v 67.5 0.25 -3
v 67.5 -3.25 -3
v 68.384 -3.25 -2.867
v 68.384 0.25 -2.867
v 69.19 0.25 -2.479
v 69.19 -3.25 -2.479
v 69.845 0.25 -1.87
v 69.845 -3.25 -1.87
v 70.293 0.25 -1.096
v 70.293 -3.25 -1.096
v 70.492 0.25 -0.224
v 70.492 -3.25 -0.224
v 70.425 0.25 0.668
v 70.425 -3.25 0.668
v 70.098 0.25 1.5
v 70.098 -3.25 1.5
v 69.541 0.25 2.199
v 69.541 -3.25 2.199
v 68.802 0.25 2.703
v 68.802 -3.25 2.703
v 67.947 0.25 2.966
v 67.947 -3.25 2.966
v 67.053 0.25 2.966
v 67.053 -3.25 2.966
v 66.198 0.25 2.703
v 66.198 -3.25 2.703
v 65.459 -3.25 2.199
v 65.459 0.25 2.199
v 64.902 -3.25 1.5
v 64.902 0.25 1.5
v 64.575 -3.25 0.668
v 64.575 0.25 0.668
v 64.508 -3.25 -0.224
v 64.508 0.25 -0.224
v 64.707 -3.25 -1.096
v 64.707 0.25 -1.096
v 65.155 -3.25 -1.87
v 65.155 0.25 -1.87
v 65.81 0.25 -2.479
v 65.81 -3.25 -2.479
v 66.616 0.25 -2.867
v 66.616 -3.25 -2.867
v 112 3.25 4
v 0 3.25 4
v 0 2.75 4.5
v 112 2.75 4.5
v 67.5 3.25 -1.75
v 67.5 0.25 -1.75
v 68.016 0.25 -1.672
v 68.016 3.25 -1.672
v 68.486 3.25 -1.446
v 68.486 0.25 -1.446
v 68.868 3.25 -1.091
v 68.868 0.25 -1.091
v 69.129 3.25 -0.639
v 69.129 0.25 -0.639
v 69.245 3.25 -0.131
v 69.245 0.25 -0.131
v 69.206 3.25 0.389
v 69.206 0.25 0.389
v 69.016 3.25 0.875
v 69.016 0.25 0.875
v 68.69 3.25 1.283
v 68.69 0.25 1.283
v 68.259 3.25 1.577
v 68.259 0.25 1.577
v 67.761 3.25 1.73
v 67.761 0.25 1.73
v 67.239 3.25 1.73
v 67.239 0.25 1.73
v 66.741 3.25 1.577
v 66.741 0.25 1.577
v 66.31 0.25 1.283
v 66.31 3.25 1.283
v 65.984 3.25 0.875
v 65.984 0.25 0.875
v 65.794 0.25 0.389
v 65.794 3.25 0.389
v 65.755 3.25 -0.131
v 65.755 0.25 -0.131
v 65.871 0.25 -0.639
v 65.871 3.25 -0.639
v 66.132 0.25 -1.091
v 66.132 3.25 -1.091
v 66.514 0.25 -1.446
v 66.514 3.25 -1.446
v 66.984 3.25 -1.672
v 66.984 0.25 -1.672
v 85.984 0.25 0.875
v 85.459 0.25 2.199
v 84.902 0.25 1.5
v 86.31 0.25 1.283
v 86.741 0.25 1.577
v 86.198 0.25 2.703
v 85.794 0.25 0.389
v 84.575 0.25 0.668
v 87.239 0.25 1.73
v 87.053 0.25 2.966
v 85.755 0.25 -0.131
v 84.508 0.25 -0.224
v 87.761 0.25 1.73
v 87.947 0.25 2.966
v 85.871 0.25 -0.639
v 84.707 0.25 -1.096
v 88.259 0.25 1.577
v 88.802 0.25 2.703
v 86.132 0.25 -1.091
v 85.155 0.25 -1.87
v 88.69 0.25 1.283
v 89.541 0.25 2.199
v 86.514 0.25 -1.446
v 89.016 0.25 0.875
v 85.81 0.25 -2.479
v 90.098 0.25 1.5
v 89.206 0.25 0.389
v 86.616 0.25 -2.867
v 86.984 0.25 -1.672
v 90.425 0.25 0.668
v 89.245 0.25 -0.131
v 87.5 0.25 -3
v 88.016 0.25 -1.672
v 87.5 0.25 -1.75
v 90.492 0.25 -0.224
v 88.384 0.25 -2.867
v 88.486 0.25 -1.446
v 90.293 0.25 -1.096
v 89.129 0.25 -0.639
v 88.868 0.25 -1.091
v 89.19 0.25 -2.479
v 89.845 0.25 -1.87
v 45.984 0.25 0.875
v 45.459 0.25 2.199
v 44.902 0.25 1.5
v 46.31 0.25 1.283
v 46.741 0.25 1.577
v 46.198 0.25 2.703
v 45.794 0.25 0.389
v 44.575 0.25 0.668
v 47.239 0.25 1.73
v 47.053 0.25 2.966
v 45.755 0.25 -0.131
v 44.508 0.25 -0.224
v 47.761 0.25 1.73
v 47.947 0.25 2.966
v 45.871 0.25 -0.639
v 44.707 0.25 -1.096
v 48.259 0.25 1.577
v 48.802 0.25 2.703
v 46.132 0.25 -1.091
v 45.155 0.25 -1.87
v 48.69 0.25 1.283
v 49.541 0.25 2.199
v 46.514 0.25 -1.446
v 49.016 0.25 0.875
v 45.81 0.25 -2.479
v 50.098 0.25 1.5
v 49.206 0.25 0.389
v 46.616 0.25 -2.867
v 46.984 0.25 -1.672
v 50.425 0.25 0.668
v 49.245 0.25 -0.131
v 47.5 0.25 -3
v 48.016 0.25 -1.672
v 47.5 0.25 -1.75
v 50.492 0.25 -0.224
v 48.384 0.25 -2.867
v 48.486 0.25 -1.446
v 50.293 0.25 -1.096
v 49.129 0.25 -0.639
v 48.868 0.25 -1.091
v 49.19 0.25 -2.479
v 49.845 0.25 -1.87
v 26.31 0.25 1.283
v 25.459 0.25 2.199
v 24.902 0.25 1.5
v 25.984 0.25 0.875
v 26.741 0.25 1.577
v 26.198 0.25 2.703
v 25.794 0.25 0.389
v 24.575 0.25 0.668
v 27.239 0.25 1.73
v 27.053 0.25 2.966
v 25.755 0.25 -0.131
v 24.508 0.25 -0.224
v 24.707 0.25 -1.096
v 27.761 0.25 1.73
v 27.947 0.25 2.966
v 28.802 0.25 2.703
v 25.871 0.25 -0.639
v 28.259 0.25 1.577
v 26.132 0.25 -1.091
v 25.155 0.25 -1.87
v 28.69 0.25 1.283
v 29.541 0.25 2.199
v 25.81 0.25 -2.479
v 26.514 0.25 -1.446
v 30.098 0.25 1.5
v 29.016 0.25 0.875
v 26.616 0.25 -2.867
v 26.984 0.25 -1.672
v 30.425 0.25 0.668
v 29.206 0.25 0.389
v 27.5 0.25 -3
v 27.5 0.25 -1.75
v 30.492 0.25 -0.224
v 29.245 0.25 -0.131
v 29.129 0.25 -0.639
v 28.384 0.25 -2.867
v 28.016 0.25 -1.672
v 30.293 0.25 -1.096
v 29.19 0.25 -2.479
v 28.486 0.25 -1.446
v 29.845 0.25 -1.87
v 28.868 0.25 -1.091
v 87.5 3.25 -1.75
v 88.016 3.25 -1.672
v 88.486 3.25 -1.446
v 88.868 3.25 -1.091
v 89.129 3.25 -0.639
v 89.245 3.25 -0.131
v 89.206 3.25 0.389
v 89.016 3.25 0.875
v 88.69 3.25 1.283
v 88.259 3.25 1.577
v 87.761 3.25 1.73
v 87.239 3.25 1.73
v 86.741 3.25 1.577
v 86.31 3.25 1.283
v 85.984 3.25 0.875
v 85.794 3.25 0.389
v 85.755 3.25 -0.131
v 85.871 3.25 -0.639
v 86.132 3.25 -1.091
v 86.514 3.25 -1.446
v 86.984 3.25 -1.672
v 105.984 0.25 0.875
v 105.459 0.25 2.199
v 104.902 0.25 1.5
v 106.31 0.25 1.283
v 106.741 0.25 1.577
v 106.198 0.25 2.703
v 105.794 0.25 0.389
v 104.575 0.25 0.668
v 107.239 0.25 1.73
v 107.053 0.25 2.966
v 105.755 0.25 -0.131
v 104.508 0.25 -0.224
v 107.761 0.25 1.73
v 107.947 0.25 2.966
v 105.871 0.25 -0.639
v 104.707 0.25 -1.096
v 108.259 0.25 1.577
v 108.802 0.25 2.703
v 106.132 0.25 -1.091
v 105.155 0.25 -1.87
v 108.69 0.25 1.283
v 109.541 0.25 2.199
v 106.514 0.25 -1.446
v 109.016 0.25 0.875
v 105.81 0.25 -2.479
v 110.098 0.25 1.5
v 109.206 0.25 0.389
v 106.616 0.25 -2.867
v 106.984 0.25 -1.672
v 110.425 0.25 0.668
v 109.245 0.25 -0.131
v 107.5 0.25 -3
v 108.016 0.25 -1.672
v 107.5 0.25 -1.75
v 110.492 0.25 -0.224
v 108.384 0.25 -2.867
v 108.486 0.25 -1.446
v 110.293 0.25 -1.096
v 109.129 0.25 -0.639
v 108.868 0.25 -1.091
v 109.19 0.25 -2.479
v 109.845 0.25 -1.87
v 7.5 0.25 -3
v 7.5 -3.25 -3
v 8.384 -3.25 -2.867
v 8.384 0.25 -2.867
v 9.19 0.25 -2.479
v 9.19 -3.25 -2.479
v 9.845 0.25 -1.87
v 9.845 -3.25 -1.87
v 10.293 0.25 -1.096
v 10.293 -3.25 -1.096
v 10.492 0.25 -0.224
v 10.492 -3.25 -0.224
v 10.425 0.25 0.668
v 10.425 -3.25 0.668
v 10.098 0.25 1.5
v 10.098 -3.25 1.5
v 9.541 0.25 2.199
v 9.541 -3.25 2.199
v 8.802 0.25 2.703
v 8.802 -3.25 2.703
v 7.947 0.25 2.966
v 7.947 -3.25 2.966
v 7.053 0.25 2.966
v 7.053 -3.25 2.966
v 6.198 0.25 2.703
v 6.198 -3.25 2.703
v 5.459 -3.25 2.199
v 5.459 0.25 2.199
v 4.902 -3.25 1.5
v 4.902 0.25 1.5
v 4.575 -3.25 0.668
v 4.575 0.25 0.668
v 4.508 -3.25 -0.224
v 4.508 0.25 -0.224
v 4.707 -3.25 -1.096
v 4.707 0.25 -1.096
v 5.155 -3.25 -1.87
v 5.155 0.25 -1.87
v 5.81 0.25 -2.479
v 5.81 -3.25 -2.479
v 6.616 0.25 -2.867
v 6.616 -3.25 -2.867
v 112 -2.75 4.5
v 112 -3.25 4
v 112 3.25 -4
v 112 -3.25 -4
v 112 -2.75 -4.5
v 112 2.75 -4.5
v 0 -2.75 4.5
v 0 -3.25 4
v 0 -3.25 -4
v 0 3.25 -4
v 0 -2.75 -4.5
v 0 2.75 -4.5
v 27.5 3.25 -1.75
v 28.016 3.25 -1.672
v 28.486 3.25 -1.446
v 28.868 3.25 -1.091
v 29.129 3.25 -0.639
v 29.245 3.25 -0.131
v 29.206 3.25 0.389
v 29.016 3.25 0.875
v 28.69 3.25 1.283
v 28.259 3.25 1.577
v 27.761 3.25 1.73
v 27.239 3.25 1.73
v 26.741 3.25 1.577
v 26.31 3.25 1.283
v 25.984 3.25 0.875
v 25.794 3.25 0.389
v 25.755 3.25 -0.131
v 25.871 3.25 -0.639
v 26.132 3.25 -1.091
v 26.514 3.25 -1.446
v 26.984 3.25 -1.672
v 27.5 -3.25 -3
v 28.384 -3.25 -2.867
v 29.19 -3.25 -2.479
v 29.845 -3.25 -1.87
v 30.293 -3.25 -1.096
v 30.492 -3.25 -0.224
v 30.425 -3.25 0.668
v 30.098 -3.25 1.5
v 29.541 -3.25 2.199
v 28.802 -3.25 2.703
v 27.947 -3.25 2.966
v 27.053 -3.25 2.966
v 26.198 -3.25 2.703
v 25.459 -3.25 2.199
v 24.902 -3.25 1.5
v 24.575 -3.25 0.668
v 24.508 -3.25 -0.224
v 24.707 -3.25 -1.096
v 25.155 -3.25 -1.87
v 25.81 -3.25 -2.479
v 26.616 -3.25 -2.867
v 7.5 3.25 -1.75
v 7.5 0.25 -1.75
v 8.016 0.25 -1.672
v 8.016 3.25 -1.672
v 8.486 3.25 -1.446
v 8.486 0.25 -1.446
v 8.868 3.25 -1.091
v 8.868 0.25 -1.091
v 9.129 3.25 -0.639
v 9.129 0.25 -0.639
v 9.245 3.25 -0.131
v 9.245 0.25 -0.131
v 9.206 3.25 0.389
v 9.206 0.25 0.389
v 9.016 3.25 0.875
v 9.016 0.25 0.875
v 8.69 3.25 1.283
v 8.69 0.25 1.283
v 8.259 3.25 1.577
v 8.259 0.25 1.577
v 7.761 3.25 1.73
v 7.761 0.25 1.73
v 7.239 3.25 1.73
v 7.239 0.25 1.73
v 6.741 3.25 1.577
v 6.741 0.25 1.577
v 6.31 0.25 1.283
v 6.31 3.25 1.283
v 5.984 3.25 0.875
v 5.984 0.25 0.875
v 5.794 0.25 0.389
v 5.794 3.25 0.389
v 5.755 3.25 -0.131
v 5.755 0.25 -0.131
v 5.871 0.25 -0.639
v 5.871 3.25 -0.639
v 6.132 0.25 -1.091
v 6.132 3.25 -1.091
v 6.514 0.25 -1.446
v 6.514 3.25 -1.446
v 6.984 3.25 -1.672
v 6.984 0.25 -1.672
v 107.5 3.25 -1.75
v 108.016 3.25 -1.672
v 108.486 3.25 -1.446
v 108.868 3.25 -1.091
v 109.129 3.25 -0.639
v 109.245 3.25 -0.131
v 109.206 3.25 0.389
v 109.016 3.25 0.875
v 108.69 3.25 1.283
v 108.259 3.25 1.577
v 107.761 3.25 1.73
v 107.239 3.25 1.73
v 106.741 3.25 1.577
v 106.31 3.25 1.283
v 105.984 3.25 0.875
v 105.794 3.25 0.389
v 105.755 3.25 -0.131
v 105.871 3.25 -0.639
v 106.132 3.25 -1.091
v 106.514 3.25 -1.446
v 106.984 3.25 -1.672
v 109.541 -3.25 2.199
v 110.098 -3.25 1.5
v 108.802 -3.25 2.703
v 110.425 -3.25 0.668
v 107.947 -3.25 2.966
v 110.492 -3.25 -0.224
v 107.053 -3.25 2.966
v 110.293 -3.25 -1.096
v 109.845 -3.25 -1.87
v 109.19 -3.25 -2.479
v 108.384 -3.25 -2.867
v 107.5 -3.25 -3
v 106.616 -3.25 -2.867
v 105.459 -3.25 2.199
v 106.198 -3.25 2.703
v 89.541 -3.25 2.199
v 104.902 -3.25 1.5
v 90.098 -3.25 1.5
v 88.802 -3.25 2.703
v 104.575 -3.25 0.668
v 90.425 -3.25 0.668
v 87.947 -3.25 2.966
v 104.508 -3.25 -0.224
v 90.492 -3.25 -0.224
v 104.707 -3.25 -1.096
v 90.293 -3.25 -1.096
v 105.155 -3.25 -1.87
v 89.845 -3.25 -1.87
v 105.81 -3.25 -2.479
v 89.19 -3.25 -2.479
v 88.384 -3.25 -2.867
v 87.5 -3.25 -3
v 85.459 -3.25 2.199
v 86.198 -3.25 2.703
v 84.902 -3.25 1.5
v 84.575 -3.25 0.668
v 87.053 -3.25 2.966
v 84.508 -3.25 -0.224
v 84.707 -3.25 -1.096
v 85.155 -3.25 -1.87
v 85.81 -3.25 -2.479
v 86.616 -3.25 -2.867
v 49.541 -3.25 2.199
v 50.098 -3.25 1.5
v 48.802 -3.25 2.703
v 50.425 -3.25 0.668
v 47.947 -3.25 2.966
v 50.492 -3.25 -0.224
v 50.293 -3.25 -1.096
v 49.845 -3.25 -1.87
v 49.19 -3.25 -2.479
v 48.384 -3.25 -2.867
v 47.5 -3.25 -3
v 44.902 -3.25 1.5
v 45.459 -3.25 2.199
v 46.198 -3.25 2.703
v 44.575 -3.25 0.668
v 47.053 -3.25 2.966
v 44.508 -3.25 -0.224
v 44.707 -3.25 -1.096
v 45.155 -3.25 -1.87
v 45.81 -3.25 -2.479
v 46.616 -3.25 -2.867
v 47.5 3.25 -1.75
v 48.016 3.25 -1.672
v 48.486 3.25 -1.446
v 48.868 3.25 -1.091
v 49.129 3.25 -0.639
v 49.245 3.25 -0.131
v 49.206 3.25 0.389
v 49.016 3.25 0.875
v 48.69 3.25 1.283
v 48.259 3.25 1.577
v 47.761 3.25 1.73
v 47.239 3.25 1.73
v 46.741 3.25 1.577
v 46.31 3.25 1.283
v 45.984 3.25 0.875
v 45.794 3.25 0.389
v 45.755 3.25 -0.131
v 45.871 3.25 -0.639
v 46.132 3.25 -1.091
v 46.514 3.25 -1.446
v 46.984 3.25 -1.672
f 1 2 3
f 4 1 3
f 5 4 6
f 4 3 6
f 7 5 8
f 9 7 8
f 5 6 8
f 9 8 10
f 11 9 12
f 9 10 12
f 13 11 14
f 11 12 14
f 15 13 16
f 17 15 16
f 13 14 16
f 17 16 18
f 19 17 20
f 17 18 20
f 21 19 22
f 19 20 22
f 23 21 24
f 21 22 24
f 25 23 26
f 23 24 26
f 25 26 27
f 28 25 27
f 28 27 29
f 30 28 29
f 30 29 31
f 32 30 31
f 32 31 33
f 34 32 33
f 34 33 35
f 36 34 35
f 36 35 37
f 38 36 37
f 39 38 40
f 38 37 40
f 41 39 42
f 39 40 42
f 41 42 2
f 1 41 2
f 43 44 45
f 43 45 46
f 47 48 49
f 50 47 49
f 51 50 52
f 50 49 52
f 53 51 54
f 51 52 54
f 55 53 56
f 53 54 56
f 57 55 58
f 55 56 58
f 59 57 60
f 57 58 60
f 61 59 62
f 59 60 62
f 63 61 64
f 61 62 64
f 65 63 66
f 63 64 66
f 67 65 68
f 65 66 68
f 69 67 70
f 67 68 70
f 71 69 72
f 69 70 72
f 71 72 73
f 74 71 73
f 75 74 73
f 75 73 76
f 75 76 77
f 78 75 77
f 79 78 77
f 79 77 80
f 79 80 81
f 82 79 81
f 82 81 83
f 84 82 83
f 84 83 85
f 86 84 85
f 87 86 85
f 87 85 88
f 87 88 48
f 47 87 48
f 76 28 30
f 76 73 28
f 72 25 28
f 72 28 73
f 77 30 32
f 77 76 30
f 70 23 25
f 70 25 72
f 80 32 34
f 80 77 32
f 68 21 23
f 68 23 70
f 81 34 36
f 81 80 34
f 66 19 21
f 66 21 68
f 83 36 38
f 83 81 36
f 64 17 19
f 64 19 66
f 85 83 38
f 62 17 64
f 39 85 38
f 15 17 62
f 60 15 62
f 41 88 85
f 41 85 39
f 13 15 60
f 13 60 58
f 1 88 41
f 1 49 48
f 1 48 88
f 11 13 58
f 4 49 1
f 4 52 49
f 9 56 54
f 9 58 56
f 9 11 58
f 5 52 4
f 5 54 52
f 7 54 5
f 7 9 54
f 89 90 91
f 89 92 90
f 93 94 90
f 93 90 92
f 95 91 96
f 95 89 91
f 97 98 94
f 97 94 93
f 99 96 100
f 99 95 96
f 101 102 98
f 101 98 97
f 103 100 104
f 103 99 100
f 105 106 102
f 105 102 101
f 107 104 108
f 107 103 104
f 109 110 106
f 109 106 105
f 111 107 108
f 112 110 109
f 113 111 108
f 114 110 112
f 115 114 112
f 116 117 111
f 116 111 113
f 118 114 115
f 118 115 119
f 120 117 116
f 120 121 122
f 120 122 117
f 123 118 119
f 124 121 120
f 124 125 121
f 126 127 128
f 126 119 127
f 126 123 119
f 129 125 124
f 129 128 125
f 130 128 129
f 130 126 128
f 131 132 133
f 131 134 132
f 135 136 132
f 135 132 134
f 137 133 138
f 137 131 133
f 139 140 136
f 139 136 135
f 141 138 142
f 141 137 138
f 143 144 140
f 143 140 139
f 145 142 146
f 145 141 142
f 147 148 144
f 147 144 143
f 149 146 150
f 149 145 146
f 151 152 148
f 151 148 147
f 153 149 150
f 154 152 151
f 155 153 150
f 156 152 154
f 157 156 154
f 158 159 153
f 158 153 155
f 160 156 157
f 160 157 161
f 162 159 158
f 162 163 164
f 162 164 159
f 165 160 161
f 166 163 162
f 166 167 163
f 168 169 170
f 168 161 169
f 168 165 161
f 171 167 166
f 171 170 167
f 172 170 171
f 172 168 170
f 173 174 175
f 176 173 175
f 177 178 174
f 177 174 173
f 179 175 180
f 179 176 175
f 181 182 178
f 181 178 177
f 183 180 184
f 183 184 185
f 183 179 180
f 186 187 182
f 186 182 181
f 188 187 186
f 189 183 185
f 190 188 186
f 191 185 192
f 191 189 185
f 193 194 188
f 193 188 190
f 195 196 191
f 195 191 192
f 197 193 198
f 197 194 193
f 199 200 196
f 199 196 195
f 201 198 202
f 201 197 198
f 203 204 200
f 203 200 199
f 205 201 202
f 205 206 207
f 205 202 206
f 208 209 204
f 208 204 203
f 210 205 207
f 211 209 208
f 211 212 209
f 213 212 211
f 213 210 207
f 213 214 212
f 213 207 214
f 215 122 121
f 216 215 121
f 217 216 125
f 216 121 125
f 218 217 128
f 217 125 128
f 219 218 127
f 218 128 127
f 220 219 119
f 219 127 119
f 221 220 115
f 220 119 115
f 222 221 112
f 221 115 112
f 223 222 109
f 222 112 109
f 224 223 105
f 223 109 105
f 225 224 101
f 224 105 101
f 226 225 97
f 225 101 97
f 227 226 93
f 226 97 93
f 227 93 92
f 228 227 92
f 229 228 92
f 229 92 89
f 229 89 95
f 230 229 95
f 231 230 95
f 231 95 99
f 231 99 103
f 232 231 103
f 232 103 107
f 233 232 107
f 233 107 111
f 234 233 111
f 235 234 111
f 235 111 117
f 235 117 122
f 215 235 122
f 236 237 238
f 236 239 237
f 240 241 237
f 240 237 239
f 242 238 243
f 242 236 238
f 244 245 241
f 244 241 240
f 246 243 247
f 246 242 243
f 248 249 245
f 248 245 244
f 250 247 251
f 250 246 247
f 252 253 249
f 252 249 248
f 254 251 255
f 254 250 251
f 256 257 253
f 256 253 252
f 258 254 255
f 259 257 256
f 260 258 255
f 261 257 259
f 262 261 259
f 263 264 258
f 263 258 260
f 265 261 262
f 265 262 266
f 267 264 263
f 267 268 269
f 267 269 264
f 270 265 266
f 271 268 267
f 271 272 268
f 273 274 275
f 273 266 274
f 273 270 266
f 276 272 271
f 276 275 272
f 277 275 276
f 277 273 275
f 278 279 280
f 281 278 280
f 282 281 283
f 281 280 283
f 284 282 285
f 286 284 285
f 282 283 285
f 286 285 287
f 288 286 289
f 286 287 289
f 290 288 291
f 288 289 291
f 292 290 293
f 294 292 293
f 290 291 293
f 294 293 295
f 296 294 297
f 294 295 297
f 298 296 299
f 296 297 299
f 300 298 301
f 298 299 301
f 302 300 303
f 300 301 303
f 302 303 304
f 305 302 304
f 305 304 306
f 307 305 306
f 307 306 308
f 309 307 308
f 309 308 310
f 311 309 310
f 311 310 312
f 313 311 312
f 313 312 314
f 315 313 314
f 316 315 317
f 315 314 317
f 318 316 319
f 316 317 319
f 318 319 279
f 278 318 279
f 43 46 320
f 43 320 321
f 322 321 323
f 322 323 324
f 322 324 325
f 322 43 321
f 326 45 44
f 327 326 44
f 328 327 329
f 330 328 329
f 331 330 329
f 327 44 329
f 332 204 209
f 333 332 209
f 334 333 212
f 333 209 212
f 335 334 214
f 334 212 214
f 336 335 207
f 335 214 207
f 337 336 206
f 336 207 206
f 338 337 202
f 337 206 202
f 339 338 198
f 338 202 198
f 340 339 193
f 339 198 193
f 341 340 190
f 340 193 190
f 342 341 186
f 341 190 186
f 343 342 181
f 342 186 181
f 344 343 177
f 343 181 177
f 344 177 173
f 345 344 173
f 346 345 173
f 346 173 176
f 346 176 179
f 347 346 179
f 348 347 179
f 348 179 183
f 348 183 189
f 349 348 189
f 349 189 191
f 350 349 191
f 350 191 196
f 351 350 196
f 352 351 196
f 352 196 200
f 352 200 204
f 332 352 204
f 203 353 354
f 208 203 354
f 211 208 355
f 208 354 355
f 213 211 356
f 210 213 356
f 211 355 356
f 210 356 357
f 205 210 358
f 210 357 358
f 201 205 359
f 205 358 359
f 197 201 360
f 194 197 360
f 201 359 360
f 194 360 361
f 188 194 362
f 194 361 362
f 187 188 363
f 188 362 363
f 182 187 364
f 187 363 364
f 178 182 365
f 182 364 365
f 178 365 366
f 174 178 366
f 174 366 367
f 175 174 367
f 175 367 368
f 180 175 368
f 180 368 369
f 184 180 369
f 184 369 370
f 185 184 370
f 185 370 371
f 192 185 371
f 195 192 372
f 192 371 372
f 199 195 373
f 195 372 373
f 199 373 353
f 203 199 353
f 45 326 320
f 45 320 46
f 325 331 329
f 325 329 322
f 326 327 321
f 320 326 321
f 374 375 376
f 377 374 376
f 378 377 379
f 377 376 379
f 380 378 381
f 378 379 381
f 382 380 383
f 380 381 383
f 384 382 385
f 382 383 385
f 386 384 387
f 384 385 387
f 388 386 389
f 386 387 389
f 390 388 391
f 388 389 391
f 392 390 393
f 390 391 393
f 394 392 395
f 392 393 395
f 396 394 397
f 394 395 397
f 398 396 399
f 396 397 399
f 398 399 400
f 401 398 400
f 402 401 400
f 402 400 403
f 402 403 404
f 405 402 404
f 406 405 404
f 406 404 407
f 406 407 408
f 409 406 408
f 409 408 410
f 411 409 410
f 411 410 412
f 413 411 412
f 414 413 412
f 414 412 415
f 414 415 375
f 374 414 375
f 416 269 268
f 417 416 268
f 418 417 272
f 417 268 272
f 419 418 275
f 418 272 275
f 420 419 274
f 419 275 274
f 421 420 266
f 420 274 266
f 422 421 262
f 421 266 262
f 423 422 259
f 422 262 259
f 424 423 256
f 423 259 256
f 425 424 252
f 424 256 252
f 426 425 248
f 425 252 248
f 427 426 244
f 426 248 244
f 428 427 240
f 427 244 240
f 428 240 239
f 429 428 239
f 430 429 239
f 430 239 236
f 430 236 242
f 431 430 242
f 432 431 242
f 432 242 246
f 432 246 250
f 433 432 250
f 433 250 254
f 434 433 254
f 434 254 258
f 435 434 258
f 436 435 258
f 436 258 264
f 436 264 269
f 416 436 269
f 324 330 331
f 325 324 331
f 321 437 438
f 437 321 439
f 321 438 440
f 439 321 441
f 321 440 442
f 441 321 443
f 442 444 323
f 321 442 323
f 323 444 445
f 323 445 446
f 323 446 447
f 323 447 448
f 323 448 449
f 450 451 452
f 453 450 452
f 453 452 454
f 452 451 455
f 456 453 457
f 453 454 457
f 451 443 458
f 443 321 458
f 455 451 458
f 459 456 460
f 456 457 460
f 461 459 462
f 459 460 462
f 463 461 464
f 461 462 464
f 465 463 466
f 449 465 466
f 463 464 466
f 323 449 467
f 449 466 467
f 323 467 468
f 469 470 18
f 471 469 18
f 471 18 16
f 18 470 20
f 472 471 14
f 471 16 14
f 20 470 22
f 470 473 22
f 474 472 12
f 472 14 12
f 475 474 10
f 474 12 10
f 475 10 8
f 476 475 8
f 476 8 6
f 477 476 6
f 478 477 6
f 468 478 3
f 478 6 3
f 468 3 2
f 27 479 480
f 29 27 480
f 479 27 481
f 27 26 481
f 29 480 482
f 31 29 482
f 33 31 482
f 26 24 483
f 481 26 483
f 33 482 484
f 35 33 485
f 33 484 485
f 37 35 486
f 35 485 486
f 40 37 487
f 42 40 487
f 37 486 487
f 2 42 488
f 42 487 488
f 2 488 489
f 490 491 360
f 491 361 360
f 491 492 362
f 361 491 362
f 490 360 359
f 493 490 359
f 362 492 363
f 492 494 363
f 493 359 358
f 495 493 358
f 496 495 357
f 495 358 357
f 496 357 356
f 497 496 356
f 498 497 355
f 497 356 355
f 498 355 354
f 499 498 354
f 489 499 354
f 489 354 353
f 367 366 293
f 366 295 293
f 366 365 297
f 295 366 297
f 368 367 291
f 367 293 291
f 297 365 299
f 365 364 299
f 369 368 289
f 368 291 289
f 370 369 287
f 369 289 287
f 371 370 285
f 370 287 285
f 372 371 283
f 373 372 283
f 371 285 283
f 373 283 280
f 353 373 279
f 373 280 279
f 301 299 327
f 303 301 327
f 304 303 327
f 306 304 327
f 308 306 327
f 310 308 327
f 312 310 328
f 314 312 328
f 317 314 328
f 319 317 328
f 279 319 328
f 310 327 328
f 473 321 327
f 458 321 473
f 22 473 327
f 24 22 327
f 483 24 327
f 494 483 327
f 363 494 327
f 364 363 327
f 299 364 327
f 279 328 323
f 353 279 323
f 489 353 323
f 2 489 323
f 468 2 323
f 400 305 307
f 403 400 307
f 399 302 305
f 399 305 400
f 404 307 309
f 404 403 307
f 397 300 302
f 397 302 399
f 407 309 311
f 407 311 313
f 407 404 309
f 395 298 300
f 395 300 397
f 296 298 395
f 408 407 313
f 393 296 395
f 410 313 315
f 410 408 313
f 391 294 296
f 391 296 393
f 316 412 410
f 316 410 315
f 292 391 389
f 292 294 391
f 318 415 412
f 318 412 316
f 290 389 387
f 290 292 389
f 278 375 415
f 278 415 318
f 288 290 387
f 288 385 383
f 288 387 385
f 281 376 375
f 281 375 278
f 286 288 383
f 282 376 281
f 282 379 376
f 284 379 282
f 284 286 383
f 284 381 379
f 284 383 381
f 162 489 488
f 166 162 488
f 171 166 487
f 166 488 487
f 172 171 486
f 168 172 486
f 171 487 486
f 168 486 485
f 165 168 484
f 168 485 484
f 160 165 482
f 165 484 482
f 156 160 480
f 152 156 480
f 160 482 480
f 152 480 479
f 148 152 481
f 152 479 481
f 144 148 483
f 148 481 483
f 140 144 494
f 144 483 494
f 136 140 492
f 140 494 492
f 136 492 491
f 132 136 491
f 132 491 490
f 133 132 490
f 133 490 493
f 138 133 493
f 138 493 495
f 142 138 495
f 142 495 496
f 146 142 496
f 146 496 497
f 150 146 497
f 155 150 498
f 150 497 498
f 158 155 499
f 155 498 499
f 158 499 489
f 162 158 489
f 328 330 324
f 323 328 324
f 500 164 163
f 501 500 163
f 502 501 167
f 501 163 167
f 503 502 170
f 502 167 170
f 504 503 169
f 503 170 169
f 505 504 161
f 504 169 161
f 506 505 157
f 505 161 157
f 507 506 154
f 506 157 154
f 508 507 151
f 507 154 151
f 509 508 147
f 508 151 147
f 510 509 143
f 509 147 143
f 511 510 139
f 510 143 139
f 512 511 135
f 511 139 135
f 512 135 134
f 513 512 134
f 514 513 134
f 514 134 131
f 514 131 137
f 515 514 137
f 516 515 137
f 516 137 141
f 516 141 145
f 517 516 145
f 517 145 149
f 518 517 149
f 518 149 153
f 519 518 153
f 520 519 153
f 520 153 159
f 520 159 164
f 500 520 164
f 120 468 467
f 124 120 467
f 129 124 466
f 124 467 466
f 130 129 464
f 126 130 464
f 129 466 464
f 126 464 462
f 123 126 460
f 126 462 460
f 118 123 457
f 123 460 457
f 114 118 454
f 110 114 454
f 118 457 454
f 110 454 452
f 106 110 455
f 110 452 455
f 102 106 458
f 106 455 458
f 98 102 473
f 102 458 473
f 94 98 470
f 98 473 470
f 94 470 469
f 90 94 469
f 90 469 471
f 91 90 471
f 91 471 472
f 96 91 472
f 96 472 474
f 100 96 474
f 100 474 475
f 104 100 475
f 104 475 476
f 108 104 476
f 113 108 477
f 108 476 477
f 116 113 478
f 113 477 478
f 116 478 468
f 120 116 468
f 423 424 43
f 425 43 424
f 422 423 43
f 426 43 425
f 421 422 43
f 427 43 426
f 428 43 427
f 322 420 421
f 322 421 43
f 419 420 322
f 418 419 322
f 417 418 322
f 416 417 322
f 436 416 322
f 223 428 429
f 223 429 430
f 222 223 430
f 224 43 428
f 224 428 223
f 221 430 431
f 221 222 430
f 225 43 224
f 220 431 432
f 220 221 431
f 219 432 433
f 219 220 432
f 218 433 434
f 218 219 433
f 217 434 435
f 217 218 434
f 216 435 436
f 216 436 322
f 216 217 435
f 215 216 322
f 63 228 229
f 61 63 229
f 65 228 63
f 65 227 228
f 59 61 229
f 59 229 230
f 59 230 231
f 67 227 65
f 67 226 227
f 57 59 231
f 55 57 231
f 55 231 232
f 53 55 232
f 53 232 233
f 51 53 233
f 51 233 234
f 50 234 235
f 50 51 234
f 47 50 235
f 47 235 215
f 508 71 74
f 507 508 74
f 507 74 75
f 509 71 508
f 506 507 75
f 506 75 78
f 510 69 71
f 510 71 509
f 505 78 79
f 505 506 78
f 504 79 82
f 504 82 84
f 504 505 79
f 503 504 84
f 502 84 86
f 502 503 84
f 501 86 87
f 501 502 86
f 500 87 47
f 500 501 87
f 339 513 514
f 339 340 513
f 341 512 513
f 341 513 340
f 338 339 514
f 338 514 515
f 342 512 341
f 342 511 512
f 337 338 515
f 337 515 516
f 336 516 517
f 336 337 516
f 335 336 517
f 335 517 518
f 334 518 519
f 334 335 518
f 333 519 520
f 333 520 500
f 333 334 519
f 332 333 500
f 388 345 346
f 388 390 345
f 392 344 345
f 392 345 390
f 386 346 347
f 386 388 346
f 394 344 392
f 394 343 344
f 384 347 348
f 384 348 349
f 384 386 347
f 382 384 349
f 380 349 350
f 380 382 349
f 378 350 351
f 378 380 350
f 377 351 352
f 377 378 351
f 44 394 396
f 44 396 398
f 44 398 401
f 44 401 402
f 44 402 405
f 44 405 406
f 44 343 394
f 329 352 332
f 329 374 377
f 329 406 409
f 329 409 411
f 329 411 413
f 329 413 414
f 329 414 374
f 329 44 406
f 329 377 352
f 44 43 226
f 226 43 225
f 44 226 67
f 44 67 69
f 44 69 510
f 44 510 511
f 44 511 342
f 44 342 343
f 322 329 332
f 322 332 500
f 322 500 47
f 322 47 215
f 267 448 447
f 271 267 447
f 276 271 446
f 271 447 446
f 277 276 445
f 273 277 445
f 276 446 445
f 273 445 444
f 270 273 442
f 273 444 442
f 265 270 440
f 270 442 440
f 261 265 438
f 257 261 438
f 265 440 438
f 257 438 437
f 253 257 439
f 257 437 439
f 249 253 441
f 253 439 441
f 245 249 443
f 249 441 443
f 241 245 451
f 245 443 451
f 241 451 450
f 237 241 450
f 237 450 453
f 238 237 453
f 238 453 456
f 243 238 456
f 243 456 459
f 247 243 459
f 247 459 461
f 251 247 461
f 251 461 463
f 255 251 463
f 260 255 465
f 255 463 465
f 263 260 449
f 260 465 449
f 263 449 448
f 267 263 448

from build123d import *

# Parameters (mm, degrees)
SKETCH_1_W          = 9
SKETCH_1_H          = 6.5
EXTRUDE_1_DEPTH     = 112
SKETCH_2_R          = 1.75
CUT_EXTRUDE_2_DEPTH = 8
SKETCH_3_R          = 3
CUT_EXTRUDE_3_DEPTH = 3.5
CHAMFER_1_SIZE      = 0.5


with BuildPart() as part:
    # 草图1 → 拉伸1 (new body)
    with BuildSketch(Plane(origin=(0, 0, 0), x_dir=(0, 0, -1), z_dir=(1, 0, 0))):
        Rectangle(SKETCH_1_W, SKETCH_1_H)
    extrude(amount=EXTRUDE_1_DEPTH)

    # 草图2 → 拉伸2 (cut)
    with BuildSketch(Plane.XZ.offset(3.25)):
        with Locations(Location((7.5, 0, 0), (0, 0, 270))):
            Circle(SKETCH_2_R)
        with Locations((167.5, 0)):
            Circle(SKETCH_2_R)
        with Locations((187.5, 0)):
            Circle(SKETCH_2_R)
        with Locations((207.5, 0)):
            Circle(SKETCH_2_R)
        with Locations((227.5, 0)):
            Circle(SKETCH_2_R)
        with Locations((247.5, 0)):
            Circle(SKETCH_2_R)
        with Locations((267.5, 0)):
            Circle(SKETCH_2_R)
        with Locations((287.5, 0)):
            Circle(SKETCH_2_R)
        with Locations(Location((27.5, 0, 0), (0, 0, 270))):
            Circle(SKETCH_2_R)
        with Locations(Location((47.5, 0, 0), (0, 0, 270))):
            Circle(SKETCH_2_R)
        with Locations(Location((67.5, 0, 0), (0, 0, 270))):
            Circle(SKETCH_2_R)
        with Locations(Location((87.5, 0, 0), (0, 0, 270))):
            Circle(SKETCH_2_R)
        with Locations(Location((107.5, 0, 0), (0, 0, 270))):
            Circle(SKETCH_2_R)
        with Locations((127.5, 0)):
            Circle(SKETCH_2_R)
        with Locations((147.5, 0)):
            Circle(SKETCH_2_R)
    extrude(amount=-CUT_EXTRUDE_2_DEPTH, mode=Mode.SUBTRACT)

    # 草图3 → 拉伸3 (cut)
    with BuildSketch(Plane.XZ.offset(3.25)):
        with Locations(Location((7.5, 0, 0), (0, 0, 270))):
            Circle(SKETCH_3_R)
        with Locations((167.5, 0)):
            Circle(SKETCH_3_R)
        with Locations((187.5, 0)):
            Circle(SKETCH_3_R)
        with Locations((207.5, 0)):
            Circle(SKETCH_3_R)
        with Locations((227.5, 0)):
            Circle(SKETCH_3_R)
        with Locations((247.5, 0)):
            Circle(SKETCH_3_R)
        with Locations((267.5, 0)):
            Circle(SKETCH_3_R)
        with Locations((287.5, 0)):
            Circle(SKETCH_3_R)
        with Locations(Location((27.5, 0, 0), (0, 0, 270))):
            Circle(SKETCH_3_R)
        with Locations(Location((47.5, 0, 0), (0, 0, 270))):
            Circle(SKETCH_3_R)
        with Locations(Location((67.5, 0, 0), (0, 0, 270))):
            Circle(SKETCH_3_R)
        with Locations(Location((87.5, 0, 0), (0, 0, 270))):
            Circle(SKETCH_3_R)
        with Locations(Location((107.5, 0, 0), (0, 0, 270))):
            Circle(SKETCH_3_R)
        with Locations((127.5, 0)):
            Circle(SKETCH_3_R)
        with Locations((147.5, 0)):
            Circle(SKETCH_3_R)
    extrude(amount=-CUT_EXTRUDE_3_DEPTH, mode=Mode.SUBTRACT)

    # 倒角1
    chamfer_1_edges = [part.edges().sort_by_distance(p)[0] for p in [
        (56, 3.25, 4.5),
        (56, 3.25, -4.5),
        (56, -3.25, -4.5),
        (56, -3.25, 4.5),
    ]]
    chamfer(chamfer_1_edges, length=CHAMFER_1_SIZE)


solid = part.part
